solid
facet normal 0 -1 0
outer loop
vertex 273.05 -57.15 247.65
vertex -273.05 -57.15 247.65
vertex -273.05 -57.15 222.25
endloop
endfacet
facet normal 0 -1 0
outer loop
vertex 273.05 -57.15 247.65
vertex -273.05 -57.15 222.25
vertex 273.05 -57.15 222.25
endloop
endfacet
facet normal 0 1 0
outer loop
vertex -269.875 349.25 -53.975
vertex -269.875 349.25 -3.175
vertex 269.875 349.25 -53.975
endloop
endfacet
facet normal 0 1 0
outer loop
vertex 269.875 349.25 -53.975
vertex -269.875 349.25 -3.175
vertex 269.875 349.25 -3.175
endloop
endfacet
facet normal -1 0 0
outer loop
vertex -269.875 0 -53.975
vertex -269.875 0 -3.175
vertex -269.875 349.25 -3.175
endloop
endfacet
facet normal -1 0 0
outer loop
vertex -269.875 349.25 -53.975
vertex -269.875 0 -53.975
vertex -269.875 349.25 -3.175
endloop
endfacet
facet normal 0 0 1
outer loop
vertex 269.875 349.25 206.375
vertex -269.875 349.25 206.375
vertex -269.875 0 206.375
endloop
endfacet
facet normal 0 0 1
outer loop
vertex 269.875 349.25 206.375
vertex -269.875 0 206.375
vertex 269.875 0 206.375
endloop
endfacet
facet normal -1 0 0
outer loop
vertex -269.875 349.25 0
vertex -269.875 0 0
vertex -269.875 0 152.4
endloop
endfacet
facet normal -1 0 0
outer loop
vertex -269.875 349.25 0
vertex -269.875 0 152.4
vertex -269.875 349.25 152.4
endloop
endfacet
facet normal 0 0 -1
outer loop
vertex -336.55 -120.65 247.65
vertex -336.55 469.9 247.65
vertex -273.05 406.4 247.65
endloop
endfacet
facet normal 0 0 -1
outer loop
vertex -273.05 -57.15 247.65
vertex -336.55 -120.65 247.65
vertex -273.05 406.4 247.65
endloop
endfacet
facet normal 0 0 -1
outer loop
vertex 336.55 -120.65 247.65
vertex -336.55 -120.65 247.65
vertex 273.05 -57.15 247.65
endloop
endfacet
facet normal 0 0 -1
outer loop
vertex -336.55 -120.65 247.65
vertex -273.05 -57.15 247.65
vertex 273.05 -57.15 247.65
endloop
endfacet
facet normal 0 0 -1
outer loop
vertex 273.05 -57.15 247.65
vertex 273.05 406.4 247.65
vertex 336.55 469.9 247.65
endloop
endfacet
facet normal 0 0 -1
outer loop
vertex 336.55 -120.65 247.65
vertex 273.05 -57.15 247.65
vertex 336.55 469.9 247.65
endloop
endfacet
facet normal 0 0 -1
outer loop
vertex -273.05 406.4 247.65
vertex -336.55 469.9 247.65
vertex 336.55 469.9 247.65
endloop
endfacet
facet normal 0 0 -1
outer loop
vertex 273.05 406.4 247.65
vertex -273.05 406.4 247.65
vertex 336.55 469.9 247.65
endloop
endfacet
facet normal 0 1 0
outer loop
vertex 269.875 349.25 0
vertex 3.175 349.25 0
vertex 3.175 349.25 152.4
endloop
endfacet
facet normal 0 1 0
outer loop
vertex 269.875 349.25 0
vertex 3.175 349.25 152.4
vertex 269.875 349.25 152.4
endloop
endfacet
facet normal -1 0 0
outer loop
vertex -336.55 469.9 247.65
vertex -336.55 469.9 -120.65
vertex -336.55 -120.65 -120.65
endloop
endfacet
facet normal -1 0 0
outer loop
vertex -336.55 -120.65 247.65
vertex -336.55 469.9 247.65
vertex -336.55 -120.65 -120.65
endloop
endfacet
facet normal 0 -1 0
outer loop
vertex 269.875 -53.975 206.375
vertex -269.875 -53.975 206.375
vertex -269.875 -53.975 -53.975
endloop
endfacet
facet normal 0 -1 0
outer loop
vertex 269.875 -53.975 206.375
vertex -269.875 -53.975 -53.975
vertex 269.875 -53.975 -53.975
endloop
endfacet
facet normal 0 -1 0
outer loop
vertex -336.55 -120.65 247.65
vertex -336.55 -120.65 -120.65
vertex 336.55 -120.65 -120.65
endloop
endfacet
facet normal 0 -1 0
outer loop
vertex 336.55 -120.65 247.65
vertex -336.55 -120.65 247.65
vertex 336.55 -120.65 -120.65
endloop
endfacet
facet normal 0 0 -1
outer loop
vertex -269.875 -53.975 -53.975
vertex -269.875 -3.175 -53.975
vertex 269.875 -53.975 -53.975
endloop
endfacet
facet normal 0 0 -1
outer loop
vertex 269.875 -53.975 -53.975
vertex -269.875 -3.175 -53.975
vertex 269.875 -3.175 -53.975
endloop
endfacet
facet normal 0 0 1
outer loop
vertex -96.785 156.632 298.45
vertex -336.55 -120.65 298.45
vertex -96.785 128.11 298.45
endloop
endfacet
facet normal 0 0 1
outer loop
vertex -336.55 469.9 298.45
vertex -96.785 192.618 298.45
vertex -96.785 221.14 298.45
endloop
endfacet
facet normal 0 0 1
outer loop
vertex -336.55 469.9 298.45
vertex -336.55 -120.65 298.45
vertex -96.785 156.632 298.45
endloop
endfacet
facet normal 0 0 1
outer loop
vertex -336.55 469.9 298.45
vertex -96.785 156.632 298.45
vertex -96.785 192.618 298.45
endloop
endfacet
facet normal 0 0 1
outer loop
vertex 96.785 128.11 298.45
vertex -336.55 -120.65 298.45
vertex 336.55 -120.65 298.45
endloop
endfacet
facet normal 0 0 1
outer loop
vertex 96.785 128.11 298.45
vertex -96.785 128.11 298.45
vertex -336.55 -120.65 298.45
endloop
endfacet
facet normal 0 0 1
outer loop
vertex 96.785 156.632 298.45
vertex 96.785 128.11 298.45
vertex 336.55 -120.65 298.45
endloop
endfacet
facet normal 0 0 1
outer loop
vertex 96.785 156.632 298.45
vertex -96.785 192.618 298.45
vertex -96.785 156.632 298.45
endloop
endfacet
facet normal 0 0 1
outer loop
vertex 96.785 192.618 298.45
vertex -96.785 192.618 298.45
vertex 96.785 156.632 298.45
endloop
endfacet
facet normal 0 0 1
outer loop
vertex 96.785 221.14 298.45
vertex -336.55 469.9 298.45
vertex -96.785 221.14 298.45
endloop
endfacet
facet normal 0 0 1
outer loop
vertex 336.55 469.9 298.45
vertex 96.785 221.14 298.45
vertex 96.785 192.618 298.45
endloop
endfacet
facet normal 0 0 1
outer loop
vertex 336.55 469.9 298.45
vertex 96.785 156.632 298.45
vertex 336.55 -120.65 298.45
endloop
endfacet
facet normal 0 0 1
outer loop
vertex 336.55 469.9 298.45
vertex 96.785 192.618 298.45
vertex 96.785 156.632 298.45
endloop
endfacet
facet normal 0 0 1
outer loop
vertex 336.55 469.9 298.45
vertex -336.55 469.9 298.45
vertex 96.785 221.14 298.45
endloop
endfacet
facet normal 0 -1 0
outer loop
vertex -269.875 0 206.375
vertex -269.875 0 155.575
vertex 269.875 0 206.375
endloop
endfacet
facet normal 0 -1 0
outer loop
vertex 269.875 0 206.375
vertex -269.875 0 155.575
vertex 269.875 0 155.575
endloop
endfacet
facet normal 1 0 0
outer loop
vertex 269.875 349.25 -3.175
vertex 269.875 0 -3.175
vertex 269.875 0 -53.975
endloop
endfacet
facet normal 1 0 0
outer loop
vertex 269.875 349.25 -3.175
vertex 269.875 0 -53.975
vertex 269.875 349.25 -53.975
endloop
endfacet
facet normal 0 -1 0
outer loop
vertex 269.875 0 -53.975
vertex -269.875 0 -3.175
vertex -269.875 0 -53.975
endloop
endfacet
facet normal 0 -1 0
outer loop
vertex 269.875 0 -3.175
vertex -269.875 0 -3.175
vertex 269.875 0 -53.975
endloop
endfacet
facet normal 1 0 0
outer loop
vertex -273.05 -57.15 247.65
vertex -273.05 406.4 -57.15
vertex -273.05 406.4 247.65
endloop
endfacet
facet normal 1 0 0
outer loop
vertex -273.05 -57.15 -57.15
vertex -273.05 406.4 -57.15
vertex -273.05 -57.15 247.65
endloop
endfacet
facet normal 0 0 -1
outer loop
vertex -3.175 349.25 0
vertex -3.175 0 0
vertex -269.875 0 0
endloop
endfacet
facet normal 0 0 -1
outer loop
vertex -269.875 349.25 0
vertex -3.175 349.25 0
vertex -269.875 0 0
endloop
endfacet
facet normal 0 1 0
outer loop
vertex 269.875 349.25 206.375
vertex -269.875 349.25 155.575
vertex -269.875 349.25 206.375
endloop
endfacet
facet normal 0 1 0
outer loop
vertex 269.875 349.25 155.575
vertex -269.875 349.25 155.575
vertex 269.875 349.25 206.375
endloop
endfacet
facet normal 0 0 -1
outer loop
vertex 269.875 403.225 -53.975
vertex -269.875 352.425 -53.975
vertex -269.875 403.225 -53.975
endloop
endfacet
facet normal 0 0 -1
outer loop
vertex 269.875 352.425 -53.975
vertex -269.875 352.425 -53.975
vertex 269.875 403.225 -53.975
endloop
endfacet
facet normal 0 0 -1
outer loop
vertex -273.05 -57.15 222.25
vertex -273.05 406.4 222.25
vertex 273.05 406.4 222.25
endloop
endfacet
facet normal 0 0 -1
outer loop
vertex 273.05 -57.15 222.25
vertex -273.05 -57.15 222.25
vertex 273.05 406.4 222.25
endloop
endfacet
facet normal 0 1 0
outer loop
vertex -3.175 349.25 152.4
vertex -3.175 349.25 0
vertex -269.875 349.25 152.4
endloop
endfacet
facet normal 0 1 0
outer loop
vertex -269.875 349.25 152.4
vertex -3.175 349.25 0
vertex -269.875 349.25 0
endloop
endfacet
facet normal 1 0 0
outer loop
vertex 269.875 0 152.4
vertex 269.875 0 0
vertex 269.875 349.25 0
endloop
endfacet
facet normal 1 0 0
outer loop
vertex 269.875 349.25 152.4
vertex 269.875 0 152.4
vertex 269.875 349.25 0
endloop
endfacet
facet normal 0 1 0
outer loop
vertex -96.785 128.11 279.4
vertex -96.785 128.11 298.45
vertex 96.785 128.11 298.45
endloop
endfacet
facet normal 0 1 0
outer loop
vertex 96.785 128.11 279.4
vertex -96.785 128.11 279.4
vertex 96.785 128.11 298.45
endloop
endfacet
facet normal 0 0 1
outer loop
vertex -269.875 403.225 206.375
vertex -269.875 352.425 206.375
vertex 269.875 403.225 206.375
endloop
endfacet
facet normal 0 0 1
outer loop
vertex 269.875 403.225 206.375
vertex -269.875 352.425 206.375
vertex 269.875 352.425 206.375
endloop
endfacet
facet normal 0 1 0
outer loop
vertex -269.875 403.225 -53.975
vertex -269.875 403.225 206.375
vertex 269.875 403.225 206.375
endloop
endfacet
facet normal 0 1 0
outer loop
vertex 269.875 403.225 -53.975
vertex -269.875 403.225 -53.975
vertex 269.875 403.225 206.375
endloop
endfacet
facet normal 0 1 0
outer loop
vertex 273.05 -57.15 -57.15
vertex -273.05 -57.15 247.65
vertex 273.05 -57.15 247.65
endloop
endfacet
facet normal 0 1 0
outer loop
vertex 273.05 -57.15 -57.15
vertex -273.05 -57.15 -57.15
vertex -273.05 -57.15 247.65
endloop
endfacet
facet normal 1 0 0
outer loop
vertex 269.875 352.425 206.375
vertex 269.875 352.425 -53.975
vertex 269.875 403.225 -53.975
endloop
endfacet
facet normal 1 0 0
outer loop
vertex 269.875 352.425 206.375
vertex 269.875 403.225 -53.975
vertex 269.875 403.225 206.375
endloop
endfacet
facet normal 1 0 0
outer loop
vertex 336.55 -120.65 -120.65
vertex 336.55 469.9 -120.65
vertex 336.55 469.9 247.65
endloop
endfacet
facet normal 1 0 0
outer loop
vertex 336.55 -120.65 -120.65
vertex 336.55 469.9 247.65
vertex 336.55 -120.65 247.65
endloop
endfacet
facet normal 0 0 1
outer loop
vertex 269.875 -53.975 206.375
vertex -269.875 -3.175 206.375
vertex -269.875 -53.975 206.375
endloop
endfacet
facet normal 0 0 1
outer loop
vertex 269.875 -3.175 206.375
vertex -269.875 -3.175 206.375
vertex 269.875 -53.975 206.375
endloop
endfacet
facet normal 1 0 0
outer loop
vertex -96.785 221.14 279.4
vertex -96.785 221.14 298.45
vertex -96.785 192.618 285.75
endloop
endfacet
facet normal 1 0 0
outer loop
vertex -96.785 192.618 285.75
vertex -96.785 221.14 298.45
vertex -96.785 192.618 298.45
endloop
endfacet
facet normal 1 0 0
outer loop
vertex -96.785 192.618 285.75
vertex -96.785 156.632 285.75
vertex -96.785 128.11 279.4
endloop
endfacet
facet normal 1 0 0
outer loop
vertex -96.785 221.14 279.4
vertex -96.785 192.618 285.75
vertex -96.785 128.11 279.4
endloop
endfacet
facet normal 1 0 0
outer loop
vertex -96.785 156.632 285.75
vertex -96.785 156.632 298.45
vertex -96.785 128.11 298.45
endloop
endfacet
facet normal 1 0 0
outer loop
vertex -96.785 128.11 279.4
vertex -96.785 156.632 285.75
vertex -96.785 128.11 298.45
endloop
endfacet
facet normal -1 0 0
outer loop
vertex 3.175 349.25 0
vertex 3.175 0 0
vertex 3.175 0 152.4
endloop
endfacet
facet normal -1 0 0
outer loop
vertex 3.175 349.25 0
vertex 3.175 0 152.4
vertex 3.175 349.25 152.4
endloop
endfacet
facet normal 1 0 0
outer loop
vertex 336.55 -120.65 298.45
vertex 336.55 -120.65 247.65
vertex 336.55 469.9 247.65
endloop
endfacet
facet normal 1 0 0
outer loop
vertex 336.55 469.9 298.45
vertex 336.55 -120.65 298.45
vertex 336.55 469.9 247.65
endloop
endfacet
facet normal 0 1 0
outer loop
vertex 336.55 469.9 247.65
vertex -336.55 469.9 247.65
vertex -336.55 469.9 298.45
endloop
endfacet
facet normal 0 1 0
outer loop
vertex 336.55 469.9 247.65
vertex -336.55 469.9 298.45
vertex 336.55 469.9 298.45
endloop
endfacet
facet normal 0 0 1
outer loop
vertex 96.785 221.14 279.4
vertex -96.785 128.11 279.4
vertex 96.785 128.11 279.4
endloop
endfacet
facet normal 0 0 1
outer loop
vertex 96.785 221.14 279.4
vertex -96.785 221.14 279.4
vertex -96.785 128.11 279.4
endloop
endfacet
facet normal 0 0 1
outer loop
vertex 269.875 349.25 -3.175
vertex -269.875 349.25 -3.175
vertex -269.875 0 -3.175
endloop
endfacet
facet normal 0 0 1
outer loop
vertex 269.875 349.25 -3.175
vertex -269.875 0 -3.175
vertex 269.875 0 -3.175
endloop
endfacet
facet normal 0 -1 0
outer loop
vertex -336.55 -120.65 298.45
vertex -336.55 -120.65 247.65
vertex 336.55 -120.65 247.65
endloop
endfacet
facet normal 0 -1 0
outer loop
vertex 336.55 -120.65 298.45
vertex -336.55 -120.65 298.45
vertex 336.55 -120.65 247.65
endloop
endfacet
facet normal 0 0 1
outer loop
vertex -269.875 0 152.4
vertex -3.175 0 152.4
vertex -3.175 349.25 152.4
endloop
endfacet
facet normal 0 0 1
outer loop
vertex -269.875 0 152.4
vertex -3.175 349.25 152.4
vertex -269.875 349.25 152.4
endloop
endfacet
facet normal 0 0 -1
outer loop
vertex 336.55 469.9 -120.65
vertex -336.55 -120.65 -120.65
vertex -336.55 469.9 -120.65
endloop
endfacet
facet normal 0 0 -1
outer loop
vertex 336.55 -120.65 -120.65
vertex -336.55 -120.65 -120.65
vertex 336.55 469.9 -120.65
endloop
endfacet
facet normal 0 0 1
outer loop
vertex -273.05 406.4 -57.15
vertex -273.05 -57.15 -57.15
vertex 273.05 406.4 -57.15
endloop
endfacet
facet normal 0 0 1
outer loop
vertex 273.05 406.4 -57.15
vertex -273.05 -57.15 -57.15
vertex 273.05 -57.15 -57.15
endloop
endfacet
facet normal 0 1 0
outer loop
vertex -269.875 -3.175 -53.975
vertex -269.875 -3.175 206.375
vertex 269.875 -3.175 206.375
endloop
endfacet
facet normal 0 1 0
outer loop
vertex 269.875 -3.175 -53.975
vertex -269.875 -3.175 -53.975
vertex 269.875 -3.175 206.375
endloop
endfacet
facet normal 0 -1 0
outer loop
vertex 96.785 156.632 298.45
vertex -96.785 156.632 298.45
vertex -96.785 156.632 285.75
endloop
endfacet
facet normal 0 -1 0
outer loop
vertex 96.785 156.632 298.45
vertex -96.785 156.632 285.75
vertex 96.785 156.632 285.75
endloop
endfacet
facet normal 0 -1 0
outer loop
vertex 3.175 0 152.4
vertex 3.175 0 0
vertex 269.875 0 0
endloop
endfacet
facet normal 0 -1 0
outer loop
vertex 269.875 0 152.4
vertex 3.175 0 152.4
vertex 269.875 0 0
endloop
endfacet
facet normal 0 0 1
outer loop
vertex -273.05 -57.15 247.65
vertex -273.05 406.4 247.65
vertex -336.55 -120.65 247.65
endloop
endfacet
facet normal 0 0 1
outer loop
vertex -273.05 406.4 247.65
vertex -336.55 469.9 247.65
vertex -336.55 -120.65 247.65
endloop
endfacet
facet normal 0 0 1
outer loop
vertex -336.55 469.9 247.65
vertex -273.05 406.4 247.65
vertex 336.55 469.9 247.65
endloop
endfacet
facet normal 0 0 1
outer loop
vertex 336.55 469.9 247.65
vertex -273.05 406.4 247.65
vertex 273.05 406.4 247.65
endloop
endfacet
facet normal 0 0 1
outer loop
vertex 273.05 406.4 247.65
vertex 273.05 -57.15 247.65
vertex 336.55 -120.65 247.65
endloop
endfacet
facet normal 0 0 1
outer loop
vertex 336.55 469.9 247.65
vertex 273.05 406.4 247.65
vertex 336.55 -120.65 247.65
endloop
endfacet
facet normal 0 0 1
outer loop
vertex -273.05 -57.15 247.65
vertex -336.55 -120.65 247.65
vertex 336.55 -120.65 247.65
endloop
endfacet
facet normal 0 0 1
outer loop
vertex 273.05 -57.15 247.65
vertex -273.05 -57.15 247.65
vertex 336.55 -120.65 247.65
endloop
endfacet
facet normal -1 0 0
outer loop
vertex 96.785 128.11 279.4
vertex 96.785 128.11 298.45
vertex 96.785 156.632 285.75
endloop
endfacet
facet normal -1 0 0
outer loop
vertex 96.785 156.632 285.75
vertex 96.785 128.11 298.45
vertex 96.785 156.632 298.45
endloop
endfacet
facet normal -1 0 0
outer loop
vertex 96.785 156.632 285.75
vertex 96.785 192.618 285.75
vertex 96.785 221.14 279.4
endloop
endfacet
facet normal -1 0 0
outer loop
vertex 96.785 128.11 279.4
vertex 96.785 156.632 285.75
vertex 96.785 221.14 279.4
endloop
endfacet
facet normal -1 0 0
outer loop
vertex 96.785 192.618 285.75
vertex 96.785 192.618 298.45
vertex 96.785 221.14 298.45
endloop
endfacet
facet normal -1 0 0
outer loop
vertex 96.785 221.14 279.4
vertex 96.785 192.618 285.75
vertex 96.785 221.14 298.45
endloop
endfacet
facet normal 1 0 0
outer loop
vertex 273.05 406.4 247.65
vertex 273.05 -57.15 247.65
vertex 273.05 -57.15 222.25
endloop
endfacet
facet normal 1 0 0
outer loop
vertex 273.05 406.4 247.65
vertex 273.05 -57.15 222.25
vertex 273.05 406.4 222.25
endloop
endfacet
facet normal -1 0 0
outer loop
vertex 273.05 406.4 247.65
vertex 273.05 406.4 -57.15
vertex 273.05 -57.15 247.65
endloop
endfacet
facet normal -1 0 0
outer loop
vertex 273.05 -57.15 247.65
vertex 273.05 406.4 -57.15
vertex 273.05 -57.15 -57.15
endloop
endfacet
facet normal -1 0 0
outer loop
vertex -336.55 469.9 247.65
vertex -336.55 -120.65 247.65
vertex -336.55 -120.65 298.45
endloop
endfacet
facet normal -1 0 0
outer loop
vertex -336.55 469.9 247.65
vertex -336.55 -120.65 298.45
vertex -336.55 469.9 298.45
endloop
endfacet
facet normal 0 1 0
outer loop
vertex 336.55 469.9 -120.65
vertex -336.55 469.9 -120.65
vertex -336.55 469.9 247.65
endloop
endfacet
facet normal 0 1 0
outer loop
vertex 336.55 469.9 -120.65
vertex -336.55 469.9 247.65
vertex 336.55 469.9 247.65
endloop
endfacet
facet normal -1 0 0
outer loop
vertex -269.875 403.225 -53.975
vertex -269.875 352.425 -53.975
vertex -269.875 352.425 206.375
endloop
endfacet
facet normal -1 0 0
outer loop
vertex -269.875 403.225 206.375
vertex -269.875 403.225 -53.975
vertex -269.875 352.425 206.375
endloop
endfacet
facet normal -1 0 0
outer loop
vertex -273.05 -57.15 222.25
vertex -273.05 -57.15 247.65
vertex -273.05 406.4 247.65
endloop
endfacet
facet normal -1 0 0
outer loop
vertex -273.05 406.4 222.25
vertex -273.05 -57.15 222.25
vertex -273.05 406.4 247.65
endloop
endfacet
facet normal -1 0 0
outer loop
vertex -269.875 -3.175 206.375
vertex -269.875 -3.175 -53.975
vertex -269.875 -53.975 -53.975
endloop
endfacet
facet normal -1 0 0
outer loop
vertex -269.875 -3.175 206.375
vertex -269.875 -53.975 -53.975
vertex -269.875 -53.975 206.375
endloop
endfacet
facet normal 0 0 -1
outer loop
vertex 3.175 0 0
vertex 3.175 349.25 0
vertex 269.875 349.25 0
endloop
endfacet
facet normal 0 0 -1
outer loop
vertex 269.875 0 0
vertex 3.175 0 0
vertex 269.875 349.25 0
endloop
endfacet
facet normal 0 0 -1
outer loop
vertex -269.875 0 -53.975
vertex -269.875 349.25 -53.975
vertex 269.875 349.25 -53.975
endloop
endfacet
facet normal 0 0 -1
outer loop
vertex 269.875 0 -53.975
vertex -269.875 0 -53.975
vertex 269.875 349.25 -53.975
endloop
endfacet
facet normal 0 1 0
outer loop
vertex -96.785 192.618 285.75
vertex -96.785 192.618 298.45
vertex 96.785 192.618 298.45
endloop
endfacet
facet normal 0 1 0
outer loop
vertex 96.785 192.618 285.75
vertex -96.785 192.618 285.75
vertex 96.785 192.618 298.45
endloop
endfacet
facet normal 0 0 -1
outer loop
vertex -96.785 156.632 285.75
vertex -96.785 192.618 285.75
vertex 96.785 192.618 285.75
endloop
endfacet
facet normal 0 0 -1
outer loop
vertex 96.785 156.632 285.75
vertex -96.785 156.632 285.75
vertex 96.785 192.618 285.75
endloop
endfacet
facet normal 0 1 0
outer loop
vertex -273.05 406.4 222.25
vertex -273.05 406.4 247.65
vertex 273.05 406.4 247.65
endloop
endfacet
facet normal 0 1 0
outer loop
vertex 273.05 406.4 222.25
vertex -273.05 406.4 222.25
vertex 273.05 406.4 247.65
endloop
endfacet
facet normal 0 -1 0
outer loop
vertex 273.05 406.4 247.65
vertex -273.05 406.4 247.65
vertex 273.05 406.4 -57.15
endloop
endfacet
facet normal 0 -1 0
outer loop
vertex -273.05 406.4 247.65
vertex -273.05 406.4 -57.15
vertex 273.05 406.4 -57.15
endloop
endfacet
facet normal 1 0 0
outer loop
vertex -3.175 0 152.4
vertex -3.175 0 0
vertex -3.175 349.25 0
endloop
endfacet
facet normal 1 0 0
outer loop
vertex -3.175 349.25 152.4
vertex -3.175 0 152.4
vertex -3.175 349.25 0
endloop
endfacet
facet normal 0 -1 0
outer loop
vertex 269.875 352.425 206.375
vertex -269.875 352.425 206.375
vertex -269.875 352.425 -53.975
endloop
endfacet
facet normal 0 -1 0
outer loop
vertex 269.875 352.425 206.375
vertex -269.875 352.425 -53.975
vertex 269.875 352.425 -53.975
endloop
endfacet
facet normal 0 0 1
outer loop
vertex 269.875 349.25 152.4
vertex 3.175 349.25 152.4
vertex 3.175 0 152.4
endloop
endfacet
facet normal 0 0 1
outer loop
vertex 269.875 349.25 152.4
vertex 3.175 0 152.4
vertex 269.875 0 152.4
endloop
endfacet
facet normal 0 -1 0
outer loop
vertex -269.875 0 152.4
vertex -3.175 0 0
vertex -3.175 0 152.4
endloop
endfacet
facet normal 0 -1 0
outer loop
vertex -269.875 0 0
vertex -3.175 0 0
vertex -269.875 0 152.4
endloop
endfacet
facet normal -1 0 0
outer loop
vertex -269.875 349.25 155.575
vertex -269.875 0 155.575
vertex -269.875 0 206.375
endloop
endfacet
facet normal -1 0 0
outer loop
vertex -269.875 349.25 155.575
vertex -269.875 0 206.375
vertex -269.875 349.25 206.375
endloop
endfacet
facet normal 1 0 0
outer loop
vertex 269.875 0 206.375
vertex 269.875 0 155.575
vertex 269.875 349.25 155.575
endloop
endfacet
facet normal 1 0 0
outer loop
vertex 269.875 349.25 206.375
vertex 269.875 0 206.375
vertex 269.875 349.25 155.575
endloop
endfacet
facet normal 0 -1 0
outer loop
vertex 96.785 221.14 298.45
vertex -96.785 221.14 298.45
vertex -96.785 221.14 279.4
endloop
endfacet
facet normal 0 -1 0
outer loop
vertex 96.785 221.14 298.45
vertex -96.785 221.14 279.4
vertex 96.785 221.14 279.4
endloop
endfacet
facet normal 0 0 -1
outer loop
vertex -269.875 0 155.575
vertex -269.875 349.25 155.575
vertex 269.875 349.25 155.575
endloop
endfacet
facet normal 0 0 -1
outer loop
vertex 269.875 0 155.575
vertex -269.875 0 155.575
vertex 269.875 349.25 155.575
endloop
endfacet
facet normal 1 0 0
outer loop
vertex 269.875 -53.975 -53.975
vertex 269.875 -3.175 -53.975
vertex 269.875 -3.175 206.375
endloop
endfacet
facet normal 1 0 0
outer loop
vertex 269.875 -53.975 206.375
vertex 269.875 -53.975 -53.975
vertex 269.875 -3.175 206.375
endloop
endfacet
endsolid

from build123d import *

# Parameters (mm, degrees)
F0_W         = 266.7
F0_H         = 349.25
F1_DEPTH     = 152.4
F5_W         = 539.75
F5_H         = 349.25
F6_DEPTH     = 50.8
F13_W        = 539.75
F13_H        = 260.35
F14_DEPTH    = 50.8
F21_W        = 673.1
F21_H        = 590.55
F22_DEPTH    = 368.3
F23_T        = -63.5
F24_W        = 546.1
F24_H        = 463.55
F25_DEPTH    = 25.4
F22_FACE_W   = 673.1
F22_FACE_H   = 590.55
F22_FACE_W_2 = 546.1
F22_FACE_H_2 = 463.55
F25_FACE_W   = 546.1
F25_FACE_H   = 463.55
F26_DEPTH    = 50.8
F27_W        = 193.5701817274
F27_H        = 28.5218954086
F27_H_2      = 35.9853618145
F28_DEPTH    = 19.05
F27_W_2      = 673.1
F27_H_3      = 590.55
F29_DEPTH    = 12.7


with BuildPart() as f1:
    # F0 (on Top) → F1 (new body)
    with BuildSketch(Plane.XY):
        with Locations((133.35, 174.625)):
            Rectangle(F0_W, F0_H)
    extrude(amount=F1_DEPTH)


with BuildPart() as f1_1:
    # F2: moved
    add(f1.part.moved(Location((3.175, 0, 0))))


with BuildPart() as f3_1:
    # F3: instance of F1
    add(f1_1.part.mirror(Plane.YZ))


with BuildPart() as f6:
    # F5 (on offset) → F6 (new body)
    with BuildSketch(Plane.XY.offset(155.575)):
        with Locations((0, 174.625)):
            Rectangle(F5_W, F5_H)
    extrude(amount=F6_DEPTH)


with BuildPart() as f11_1:
    # F11: instance of F6
    add(f6.part.mirror(Plane(origin=(266.7, 349.25, 76.2), x_dir=(-1, 0, 0), z_dir=(0, 0, -1))))


with BuildPart() as f14:
    # F13 (on offset) → F14 (new body)
    with BuildSketch(Plane.XZ.offset(3.175)):
        with Locations((0, 76.2)):
            Rectangle(F13_W, F13_H)
    extrude(amount=F14_DEPTH)


with BuildPart() as f19_1:
    # F19: instance of F14
    add(f14.part.mirror(Plane(origin=(266.7, 174.625, 0), x_dir=(0, 0, 1), z_dir=(0, 1, 0))))


with BuildPart() as f22:
    # F21 (on offset) → F22 (new body)
    with BuildSketch(Plane(origin=(0, 0, -120.65), x_dir=(1, 0, 0), z_dir=(0, 0, -1))):
        with Locations((0, -174.625)):
            Rectangle(F21_W, F21_H)
    extrude(amount=-F22_DEPTH)

    # F23
    f23_openings = [f22.faces().sort_by_distance(p)[0] for p in [
        (0, 174.625, 247.65),
    ]]
    offset(amount=F23_T, openings=f23_openings)


with BuildPart() as f25:
    # F24 (on face) → F25 (new body)
    with BuildSketch(Plane.XY.offset(247.65)):
        with Locations((0, 174.625)):
            Rectangle(F24_W, F24_H)
    extrude(amount=-F25_DEPTH)

    # F22_face (on face) + F25_face (on face) → F26 (join)
    with BuildSketch(Plane(origin=(0, 174.625, 247.65), x_dir=(1, 0, 0), z_dir=(0, 0, 1))):
        Rectangle(F22_FACE_W, F22_FACE_H)
        Rectangle(F22_FACE_W_2, F22_FACE_H_2, mode=Mode.SUBTRACT)
    with BuildSketch(Plane(origin=(0, 174.625, 247.65), x_dir=(1, 0, 0), z_dir=(0, 0, 1))):
        Rectangle(F25_FACE_W, F25_FACE_H)
    extrude(amount=F26_DEPTH)

    # F27 (on face) → F28 (cut)
    with BuildSketch(Plane.XY.offset(298.45)):
        with Locations((0, 142.3713713884)):
            Rectangle(F27_W, F27_H)
        with Locations((0, 174.625)):
            Rectangle(F27_W, F27_H_2)
        with Locations((0, 206.8786286116)):
            Rectangle(F27_W, F27_H)
    extrude(amount=-F28_DEPTH, mode=Mode.SUBTRACT)

    # F27 (on face) → F29 (join)
    with BuildSketch(Plane.XY.offset(298.45)):
        with Locations((0, 174.625)):
            Rectangle(F27_W_2, F27_H_3)
        Polygon((96.7850908637, 156.6323190928), (96.7850908637, 128.1104236841), (-96.7850908637, 128.1104236841), (-96.7850908637, 156.6323190928), (-96.7850908637, 192.6176809072), (-96.7850908637, 221.1395763159), (96.7850908637, 221.1395763159), (96.7850908637, 192.6176809072), align=None, mode=Mode.SUBTRACT)
        with Locations((0, 174.625)):
            Rectangle(F27_W, F27_H_2)
    extrude(amount=-F29_DEPTH)


solid = Compound([f1_1.part, f3_1.part, f6.part, f11_1.part, f14.part, f19_1.part, f22.part, f25.part])
